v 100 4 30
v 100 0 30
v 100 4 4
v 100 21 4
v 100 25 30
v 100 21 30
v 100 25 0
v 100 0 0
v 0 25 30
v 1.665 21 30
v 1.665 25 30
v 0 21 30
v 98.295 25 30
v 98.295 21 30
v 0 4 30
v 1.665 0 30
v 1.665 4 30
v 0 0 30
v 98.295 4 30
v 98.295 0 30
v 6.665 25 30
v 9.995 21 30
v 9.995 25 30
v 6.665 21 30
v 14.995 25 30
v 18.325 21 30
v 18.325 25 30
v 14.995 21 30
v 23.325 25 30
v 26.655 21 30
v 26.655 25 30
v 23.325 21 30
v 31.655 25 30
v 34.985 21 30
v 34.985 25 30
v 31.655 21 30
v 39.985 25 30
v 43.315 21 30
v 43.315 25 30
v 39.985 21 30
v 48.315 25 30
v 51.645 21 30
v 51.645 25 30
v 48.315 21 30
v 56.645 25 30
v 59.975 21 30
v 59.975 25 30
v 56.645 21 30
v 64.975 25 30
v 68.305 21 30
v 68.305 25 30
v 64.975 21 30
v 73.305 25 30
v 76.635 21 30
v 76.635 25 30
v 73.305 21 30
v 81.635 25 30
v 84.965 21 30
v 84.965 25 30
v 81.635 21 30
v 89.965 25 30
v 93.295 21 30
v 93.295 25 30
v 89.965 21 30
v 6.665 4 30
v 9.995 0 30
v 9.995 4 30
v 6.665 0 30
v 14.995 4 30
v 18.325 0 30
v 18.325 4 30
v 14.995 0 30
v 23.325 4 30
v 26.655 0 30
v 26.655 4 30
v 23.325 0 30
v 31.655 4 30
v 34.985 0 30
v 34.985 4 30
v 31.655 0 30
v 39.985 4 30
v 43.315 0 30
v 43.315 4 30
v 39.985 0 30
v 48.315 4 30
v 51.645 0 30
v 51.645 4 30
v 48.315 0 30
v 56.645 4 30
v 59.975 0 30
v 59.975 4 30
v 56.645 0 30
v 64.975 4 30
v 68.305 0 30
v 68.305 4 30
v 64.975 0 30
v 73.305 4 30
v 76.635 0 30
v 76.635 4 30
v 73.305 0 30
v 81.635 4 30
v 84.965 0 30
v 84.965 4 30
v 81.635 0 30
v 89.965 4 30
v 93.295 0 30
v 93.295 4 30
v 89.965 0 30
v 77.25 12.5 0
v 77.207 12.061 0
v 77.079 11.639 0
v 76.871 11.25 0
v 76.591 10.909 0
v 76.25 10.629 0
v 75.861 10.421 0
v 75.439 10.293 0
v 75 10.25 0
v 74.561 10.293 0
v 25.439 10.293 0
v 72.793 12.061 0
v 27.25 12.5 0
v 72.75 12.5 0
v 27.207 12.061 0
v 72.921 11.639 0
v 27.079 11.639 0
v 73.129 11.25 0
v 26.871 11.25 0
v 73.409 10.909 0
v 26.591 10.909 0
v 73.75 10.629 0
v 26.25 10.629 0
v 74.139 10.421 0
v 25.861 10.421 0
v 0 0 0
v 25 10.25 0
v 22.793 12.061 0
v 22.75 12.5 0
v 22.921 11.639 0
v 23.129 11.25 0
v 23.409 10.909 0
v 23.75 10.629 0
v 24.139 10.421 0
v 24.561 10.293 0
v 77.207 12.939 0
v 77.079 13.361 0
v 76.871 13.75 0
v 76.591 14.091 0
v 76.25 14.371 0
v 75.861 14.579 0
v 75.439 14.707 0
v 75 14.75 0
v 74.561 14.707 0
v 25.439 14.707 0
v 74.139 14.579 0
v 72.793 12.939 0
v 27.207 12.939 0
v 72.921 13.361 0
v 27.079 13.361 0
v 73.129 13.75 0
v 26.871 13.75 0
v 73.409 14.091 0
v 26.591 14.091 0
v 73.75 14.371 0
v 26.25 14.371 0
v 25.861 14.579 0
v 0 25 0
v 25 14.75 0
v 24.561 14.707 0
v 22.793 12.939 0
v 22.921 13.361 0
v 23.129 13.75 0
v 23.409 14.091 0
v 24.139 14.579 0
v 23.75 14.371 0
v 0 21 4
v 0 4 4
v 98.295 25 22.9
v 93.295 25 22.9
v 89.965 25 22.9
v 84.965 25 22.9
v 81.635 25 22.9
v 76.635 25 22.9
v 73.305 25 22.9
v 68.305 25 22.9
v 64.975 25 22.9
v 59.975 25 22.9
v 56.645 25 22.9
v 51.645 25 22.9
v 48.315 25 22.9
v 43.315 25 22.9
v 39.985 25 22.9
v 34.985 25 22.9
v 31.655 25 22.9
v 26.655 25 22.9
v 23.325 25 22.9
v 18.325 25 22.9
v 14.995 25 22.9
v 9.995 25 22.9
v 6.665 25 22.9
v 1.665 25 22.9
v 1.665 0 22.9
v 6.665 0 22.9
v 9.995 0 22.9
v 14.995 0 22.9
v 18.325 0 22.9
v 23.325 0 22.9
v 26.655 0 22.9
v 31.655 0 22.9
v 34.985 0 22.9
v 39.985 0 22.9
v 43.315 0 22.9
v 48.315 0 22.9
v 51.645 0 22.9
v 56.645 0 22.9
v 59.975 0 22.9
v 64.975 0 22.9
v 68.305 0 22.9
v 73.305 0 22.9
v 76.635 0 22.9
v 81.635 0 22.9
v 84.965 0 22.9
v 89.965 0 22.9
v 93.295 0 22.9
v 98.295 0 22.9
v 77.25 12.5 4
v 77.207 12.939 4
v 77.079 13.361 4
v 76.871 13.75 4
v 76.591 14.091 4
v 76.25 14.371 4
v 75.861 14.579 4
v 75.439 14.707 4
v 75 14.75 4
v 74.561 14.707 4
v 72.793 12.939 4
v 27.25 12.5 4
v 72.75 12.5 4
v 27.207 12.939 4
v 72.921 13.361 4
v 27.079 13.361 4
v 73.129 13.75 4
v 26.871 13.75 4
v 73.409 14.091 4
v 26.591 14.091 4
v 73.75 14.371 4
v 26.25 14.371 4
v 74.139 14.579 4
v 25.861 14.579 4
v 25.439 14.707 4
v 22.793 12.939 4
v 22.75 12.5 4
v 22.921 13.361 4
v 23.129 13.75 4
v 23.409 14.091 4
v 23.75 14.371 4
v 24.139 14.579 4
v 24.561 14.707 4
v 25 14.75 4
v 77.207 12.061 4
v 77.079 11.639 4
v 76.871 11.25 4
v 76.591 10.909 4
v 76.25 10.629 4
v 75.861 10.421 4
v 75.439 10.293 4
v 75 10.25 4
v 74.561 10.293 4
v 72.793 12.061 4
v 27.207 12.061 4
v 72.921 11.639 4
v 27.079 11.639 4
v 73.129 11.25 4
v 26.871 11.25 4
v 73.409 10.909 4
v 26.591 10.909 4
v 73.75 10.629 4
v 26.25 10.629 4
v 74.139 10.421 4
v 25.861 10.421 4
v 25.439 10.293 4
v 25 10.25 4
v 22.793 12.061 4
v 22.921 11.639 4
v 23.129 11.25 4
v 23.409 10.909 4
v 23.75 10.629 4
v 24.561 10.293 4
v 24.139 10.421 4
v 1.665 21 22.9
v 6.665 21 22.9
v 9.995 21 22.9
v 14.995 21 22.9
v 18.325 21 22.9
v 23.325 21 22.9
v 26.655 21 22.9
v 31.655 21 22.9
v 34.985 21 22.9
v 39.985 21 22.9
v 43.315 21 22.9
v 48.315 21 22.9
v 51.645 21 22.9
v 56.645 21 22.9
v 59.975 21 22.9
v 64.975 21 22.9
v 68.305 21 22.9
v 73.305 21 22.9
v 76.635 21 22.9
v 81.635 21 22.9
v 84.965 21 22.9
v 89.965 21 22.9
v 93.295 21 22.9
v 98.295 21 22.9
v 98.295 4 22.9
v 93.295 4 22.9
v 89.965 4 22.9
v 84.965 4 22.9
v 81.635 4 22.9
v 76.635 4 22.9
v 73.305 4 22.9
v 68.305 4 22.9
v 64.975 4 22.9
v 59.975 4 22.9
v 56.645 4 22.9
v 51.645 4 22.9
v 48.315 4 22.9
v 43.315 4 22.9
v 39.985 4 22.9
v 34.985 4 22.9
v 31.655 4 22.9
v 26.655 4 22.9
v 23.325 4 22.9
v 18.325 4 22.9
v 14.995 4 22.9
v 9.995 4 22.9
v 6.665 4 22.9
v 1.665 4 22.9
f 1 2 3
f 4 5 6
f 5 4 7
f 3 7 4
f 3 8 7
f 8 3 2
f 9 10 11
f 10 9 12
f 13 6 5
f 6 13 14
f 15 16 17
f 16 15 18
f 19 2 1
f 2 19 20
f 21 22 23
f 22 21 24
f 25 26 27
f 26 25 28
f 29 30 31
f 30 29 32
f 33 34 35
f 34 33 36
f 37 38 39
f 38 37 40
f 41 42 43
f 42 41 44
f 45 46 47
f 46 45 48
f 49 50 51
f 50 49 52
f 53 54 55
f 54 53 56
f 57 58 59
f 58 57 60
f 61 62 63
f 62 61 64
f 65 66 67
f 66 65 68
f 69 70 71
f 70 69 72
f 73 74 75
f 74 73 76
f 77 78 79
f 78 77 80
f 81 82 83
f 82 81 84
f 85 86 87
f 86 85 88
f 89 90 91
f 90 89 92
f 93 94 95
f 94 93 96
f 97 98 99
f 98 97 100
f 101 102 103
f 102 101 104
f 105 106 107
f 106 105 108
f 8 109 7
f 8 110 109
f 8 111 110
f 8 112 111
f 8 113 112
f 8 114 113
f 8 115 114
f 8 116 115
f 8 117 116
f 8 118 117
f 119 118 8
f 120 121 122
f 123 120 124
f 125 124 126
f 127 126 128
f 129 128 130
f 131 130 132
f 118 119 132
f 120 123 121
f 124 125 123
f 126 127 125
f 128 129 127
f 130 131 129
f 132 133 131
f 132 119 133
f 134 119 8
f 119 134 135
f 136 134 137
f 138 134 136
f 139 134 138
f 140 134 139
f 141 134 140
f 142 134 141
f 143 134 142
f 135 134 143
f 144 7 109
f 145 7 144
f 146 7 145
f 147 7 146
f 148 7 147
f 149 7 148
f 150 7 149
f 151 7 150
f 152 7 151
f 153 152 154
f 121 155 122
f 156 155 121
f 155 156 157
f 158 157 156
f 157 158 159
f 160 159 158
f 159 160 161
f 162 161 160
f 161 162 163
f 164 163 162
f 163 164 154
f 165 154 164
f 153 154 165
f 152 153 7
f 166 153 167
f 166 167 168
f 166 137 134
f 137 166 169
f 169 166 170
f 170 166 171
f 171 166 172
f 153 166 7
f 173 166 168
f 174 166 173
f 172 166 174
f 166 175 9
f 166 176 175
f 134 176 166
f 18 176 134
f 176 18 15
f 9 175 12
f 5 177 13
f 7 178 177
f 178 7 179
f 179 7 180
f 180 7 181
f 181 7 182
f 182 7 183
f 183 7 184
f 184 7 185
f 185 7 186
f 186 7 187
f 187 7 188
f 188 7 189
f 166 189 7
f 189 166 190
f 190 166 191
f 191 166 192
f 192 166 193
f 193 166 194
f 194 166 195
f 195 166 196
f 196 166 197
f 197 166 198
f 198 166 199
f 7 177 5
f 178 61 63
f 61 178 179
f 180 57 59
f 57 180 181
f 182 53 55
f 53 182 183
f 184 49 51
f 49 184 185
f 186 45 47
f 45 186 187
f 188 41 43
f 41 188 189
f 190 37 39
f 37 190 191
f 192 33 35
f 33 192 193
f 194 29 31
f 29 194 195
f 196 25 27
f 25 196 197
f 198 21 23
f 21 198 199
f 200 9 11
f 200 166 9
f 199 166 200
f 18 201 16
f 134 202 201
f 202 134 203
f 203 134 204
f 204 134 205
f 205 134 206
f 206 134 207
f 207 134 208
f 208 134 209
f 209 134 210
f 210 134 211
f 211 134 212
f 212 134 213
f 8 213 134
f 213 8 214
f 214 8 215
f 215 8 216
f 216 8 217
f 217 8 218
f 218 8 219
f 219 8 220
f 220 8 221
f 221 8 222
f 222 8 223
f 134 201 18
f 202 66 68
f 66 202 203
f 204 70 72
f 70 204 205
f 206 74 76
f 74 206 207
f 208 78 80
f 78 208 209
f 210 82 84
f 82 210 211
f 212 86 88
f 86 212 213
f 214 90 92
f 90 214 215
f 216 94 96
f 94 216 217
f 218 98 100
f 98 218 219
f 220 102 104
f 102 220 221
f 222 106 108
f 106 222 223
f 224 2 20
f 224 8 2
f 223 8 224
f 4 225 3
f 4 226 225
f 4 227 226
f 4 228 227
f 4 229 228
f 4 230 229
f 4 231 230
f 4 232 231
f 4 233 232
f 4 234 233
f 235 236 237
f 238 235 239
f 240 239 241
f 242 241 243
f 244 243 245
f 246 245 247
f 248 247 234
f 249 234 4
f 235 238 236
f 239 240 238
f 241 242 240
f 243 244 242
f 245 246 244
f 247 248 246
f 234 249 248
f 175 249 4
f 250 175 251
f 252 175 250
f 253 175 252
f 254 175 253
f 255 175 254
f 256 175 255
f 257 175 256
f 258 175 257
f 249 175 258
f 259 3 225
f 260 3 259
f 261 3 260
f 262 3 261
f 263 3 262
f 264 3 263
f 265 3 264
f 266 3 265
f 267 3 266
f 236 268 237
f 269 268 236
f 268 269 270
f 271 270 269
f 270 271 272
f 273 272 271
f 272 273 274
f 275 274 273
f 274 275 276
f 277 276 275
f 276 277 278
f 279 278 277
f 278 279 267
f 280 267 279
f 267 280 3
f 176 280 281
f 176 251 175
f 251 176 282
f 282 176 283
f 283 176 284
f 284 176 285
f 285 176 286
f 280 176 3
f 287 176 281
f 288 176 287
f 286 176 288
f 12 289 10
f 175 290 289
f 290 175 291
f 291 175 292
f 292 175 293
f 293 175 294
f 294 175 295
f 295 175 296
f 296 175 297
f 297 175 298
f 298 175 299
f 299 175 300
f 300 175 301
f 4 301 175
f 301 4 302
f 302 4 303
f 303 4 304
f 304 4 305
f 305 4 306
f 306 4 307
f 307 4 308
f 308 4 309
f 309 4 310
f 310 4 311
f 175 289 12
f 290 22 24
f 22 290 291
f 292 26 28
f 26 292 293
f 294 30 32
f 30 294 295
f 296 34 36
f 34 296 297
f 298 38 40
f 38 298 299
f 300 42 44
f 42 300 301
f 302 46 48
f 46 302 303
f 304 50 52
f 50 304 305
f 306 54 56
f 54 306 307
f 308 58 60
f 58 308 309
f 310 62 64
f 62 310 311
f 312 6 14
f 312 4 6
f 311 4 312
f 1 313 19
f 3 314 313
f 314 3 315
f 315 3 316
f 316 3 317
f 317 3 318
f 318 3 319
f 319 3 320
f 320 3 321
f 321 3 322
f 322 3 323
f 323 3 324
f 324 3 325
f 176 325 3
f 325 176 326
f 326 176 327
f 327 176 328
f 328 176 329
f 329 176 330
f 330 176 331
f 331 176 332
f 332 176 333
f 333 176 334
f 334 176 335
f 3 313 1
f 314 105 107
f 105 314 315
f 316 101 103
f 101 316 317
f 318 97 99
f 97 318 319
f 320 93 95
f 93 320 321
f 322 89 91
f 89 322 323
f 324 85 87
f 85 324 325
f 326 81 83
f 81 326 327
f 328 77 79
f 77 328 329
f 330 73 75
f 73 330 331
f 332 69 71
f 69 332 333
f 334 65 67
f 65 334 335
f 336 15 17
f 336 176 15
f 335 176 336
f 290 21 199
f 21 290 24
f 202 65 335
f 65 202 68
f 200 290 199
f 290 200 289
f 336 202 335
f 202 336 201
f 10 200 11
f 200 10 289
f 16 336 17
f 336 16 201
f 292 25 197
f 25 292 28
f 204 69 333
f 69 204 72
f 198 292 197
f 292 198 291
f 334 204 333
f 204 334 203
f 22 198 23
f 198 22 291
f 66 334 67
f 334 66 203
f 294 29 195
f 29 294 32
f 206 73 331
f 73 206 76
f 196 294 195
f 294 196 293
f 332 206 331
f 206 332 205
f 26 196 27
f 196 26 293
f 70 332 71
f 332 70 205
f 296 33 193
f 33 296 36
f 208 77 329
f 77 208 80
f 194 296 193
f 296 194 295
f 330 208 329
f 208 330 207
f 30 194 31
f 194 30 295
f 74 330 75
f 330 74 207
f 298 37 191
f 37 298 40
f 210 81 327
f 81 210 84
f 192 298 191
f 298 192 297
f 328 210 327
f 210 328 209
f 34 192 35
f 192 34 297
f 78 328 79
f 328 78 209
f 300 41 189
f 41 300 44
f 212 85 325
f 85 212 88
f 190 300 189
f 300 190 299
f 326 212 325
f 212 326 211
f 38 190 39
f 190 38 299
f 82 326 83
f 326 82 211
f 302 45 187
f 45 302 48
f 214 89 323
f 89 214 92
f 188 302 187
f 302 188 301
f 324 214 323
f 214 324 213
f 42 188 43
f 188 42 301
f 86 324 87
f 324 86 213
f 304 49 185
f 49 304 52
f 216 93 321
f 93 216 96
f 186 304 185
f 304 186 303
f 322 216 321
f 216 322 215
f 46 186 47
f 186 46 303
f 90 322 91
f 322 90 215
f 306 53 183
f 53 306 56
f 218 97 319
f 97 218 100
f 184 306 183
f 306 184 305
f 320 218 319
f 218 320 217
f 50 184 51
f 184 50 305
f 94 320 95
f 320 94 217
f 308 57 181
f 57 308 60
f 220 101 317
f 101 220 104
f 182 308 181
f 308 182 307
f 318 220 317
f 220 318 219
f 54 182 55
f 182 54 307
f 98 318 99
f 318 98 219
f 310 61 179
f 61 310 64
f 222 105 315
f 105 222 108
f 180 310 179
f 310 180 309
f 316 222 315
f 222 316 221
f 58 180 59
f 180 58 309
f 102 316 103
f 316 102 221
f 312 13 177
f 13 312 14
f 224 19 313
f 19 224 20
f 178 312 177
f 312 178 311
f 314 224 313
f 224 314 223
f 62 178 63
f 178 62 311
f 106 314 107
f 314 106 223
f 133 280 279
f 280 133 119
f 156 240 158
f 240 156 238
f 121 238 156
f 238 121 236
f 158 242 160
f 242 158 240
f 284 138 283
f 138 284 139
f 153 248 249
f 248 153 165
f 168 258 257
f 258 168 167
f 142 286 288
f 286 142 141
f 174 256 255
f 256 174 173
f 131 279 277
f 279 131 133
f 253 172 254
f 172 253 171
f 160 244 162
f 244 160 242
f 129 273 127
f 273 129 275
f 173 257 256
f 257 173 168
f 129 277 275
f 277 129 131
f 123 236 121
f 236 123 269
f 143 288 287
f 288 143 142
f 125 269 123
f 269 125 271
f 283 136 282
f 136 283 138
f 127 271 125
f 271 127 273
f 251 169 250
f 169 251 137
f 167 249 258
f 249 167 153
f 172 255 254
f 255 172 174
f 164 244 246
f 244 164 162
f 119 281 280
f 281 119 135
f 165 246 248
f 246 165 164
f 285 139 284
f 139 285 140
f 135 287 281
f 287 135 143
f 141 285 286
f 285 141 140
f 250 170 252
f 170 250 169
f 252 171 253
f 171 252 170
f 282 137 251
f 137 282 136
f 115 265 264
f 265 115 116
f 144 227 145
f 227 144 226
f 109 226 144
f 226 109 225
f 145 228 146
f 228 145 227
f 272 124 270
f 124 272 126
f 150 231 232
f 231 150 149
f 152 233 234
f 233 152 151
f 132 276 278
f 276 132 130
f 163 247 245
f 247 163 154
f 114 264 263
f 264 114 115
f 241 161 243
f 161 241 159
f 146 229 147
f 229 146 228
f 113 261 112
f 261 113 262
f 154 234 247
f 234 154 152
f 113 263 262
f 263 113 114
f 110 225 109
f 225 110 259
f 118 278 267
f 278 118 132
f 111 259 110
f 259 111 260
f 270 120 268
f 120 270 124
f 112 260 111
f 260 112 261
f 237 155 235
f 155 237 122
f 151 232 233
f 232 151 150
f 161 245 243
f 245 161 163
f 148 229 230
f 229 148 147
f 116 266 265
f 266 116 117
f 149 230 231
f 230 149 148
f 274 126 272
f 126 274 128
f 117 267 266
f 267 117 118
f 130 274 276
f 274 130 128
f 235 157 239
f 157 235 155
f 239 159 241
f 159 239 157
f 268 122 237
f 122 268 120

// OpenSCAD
$fn = 32;

// ----------------------------------------------------------------------
// Cable duct: 100 x 25 x 30 mm, 12 fingers
// ----------------------------------------------------------------------

// --- parameters (mm) ---
tray_len = 100;           // duct length, X
tray_w = 25;              // duct width, Y
tray_h = 30;              // duct height, Z
tray_t = 4;               // side wall thickness
floor_t = 4;              // floor thickness
slot_w = 5;               // finger slot width
slot_h = 18.9;            // finger slot height
fingers = 12;             // number of finger slots per side
pitch = 8.33;             // finger pitch
hole_d = 4.5;             // floor mounting hole
hole_n = 2;               // mounting holes in the floor

module shell() {
  difference() {
    cube([tray_len, tray_w, tray_h]);
    /* open top channel */
    translate([-tray_t - 1, tray_t, floor_t])
      cube([tray_len + 2 * tray_t + 2, tray_w - 2 * tray_t, tray_h + 1]);
  }
}

difference() {
  union() {
    shell();
  }
  /* finger slots cut through both side walls */
  for (i = [0 : fingers - 1]) translate([pitch / 2 + i * pitch - slot_w / 2, -1, floor_t + slot_h]) cube([slot_w, tray_w + 2, tray_h]);
  for (i = [0 : hole_n - 1]) translate([(tray_len / hole_n) * (i + 0.5), tray_w / 2, -1]) cylinder(h = floor_t + 2, d = hole_d);
}
